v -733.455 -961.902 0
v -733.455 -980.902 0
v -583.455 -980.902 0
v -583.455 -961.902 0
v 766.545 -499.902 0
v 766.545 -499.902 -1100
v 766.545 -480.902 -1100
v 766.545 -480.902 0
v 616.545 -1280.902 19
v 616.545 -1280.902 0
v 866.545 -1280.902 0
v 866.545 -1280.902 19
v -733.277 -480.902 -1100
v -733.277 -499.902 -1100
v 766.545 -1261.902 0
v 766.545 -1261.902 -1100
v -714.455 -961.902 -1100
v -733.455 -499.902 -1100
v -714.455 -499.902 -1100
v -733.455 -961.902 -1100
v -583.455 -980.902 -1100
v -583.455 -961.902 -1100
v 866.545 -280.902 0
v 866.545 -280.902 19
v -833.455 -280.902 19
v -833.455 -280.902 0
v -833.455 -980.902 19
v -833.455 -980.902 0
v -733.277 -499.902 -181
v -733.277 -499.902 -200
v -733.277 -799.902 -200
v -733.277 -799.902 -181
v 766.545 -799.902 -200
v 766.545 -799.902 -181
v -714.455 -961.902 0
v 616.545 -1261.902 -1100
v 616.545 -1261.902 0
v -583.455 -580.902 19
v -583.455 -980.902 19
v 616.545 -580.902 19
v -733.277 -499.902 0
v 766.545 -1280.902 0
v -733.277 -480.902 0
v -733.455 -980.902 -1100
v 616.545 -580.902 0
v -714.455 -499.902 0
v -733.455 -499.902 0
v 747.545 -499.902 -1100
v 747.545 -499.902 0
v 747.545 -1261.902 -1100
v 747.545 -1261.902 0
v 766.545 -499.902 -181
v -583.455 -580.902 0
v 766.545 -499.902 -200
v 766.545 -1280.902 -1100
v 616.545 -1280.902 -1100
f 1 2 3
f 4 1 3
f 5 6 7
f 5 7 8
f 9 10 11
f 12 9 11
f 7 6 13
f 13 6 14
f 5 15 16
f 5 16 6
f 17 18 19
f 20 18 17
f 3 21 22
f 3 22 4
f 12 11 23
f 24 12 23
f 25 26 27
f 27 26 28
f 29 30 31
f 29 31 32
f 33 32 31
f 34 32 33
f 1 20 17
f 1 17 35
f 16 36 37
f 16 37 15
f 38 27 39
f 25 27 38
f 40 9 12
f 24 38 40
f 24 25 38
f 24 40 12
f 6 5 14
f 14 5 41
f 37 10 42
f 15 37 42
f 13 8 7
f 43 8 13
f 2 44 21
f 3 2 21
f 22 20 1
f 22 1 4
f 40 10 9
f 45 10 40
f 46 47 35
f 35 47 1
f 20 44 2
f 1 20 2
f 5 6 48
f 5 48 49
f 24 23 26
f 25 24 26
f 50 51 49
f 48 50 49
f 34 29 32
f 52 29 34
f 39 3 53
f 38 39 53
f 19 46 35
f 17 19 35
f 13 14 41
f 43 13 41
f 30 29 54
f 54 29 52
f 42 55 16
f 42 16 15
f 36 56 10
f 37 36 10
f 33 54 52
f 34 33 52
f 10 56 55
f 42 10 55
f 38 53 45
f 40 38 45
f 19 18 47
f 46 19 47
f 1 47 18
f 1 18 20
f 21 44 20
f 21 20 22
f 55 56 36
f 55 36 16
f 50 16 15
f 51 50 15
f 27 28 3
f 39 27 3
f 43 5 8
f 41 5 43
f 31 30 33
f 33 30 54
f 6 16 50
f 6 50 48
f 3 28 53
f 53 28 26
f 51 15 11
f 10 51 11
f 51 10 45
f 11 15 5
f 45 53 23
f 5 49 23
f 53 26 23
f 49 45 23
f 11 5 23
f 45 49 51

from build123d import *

# Parameters (mm, degrees)
F0_W      = 250
F0_H      = 400
F0_H_2    = 700
F1_DEPTH  = 19
F2_W      = 150
F2_H      = 1100
F3_DEPTH  = 19
F4_W      = 150
F4_H      = 1100
F5_DEPTH  = 19
F6_W      = 762
F6_H      = 1100
F7_DEPTH  = 19
F8_W      = 462
F8_H      = 1100
F9_DEPTH  = 19
F10_W     = 1499.8221993446
F10_H     = 1100
F11_DEPTH = 19
F12_W     = 1499.8221993446
F12_H     = 19
F13_DEPTH = 300


with BuildPart() as f1:
    # F0 (on Top) → F1 (new body)
    with BuildSketch(Plane.XY):
        Polygon((-833.4551215172, -280.901658535), (-833.4551215172, -580.901658535), (-583.4551215172, -580.901658535), (616.5448784828, -580.901658535), (866.5448784828, -580.901658535), (866.5448784828, -280.901658535), align=None)
        with Locations((-708.4551215172, -780.901658535)):
            Rectangle(F0_W, F0_H)
        with Locations((741.5448784828, -930.901658535)):
            Rectangle(F0_W, F0_H_2)
    extrude(amount=F1_DEPTH)

    # F6 (on face) → F7 (join)
    with BuildSketch(Plane.YZ.offset(766.5448784828)):
        with Locations((-880.901658535, -550)):
            Rectangle(F6_W, F6_H)
    extrude(amount=-F7_DEPTH)


with BuildPart() as f3:
    # F2 (on face) → F3 (new body)
    with BuildSketch(Plane.XZ.offset(1280.901658535)):
        with Locations((691.5448784828, -550)):
            Rectangle(F2_W, F2_H)
    extrude(amount=-F3_DEPTH)


with BuildPart() as f5:
    # F4 (on face) → F5 (new body)
    with BuildSketch(Plane.XZ.offset(980.901658535)):
        with Locations((-658.4551215172, -550)):
            Rectangle(F4_W, F4_H)
    extrude(amount=-F5_DEPTH)


with BuildPart() as f9:
    # F8 (on face) → F9 (new body)
    with BuildSketch(Plane(origin=(-733.4551215172, 0, 0), x_dir=(0, -1, 0), z_dir=(-1, 0, 0))):
        with Locations((730.901658535, -550)):
            Rectangle(F8_W, F8_H)
    extrude(amount=-F9_DEPTH)


with BuildPart() as f11:
    # F10 (on face) → F11 (new body)
    with BuildSketch(Plane(origin=(0, -499.901658535, 0), x_dir=(-1, 0, 0), z_dir=(0, 1, 0))):
        with Locations((-16.6337788105, -550)):
            Rectangle(F10_W, F10_H)
    extrude(amount=F11_DEPTH)


with BuildPart() as f13:
    # F12 (on face) → F13 (new body)
    with BuildSketch(Plane.XZ.offset(499.901658535)):
        with Locations((16.6337788105, -190.5)):
            Rectangle(F12_W, F12_H)
    extrude(amount=F13_DEPTH)


solid = Compound([f1.part, f3.part, f5.part, f9.part, f11.part, f13.part])
